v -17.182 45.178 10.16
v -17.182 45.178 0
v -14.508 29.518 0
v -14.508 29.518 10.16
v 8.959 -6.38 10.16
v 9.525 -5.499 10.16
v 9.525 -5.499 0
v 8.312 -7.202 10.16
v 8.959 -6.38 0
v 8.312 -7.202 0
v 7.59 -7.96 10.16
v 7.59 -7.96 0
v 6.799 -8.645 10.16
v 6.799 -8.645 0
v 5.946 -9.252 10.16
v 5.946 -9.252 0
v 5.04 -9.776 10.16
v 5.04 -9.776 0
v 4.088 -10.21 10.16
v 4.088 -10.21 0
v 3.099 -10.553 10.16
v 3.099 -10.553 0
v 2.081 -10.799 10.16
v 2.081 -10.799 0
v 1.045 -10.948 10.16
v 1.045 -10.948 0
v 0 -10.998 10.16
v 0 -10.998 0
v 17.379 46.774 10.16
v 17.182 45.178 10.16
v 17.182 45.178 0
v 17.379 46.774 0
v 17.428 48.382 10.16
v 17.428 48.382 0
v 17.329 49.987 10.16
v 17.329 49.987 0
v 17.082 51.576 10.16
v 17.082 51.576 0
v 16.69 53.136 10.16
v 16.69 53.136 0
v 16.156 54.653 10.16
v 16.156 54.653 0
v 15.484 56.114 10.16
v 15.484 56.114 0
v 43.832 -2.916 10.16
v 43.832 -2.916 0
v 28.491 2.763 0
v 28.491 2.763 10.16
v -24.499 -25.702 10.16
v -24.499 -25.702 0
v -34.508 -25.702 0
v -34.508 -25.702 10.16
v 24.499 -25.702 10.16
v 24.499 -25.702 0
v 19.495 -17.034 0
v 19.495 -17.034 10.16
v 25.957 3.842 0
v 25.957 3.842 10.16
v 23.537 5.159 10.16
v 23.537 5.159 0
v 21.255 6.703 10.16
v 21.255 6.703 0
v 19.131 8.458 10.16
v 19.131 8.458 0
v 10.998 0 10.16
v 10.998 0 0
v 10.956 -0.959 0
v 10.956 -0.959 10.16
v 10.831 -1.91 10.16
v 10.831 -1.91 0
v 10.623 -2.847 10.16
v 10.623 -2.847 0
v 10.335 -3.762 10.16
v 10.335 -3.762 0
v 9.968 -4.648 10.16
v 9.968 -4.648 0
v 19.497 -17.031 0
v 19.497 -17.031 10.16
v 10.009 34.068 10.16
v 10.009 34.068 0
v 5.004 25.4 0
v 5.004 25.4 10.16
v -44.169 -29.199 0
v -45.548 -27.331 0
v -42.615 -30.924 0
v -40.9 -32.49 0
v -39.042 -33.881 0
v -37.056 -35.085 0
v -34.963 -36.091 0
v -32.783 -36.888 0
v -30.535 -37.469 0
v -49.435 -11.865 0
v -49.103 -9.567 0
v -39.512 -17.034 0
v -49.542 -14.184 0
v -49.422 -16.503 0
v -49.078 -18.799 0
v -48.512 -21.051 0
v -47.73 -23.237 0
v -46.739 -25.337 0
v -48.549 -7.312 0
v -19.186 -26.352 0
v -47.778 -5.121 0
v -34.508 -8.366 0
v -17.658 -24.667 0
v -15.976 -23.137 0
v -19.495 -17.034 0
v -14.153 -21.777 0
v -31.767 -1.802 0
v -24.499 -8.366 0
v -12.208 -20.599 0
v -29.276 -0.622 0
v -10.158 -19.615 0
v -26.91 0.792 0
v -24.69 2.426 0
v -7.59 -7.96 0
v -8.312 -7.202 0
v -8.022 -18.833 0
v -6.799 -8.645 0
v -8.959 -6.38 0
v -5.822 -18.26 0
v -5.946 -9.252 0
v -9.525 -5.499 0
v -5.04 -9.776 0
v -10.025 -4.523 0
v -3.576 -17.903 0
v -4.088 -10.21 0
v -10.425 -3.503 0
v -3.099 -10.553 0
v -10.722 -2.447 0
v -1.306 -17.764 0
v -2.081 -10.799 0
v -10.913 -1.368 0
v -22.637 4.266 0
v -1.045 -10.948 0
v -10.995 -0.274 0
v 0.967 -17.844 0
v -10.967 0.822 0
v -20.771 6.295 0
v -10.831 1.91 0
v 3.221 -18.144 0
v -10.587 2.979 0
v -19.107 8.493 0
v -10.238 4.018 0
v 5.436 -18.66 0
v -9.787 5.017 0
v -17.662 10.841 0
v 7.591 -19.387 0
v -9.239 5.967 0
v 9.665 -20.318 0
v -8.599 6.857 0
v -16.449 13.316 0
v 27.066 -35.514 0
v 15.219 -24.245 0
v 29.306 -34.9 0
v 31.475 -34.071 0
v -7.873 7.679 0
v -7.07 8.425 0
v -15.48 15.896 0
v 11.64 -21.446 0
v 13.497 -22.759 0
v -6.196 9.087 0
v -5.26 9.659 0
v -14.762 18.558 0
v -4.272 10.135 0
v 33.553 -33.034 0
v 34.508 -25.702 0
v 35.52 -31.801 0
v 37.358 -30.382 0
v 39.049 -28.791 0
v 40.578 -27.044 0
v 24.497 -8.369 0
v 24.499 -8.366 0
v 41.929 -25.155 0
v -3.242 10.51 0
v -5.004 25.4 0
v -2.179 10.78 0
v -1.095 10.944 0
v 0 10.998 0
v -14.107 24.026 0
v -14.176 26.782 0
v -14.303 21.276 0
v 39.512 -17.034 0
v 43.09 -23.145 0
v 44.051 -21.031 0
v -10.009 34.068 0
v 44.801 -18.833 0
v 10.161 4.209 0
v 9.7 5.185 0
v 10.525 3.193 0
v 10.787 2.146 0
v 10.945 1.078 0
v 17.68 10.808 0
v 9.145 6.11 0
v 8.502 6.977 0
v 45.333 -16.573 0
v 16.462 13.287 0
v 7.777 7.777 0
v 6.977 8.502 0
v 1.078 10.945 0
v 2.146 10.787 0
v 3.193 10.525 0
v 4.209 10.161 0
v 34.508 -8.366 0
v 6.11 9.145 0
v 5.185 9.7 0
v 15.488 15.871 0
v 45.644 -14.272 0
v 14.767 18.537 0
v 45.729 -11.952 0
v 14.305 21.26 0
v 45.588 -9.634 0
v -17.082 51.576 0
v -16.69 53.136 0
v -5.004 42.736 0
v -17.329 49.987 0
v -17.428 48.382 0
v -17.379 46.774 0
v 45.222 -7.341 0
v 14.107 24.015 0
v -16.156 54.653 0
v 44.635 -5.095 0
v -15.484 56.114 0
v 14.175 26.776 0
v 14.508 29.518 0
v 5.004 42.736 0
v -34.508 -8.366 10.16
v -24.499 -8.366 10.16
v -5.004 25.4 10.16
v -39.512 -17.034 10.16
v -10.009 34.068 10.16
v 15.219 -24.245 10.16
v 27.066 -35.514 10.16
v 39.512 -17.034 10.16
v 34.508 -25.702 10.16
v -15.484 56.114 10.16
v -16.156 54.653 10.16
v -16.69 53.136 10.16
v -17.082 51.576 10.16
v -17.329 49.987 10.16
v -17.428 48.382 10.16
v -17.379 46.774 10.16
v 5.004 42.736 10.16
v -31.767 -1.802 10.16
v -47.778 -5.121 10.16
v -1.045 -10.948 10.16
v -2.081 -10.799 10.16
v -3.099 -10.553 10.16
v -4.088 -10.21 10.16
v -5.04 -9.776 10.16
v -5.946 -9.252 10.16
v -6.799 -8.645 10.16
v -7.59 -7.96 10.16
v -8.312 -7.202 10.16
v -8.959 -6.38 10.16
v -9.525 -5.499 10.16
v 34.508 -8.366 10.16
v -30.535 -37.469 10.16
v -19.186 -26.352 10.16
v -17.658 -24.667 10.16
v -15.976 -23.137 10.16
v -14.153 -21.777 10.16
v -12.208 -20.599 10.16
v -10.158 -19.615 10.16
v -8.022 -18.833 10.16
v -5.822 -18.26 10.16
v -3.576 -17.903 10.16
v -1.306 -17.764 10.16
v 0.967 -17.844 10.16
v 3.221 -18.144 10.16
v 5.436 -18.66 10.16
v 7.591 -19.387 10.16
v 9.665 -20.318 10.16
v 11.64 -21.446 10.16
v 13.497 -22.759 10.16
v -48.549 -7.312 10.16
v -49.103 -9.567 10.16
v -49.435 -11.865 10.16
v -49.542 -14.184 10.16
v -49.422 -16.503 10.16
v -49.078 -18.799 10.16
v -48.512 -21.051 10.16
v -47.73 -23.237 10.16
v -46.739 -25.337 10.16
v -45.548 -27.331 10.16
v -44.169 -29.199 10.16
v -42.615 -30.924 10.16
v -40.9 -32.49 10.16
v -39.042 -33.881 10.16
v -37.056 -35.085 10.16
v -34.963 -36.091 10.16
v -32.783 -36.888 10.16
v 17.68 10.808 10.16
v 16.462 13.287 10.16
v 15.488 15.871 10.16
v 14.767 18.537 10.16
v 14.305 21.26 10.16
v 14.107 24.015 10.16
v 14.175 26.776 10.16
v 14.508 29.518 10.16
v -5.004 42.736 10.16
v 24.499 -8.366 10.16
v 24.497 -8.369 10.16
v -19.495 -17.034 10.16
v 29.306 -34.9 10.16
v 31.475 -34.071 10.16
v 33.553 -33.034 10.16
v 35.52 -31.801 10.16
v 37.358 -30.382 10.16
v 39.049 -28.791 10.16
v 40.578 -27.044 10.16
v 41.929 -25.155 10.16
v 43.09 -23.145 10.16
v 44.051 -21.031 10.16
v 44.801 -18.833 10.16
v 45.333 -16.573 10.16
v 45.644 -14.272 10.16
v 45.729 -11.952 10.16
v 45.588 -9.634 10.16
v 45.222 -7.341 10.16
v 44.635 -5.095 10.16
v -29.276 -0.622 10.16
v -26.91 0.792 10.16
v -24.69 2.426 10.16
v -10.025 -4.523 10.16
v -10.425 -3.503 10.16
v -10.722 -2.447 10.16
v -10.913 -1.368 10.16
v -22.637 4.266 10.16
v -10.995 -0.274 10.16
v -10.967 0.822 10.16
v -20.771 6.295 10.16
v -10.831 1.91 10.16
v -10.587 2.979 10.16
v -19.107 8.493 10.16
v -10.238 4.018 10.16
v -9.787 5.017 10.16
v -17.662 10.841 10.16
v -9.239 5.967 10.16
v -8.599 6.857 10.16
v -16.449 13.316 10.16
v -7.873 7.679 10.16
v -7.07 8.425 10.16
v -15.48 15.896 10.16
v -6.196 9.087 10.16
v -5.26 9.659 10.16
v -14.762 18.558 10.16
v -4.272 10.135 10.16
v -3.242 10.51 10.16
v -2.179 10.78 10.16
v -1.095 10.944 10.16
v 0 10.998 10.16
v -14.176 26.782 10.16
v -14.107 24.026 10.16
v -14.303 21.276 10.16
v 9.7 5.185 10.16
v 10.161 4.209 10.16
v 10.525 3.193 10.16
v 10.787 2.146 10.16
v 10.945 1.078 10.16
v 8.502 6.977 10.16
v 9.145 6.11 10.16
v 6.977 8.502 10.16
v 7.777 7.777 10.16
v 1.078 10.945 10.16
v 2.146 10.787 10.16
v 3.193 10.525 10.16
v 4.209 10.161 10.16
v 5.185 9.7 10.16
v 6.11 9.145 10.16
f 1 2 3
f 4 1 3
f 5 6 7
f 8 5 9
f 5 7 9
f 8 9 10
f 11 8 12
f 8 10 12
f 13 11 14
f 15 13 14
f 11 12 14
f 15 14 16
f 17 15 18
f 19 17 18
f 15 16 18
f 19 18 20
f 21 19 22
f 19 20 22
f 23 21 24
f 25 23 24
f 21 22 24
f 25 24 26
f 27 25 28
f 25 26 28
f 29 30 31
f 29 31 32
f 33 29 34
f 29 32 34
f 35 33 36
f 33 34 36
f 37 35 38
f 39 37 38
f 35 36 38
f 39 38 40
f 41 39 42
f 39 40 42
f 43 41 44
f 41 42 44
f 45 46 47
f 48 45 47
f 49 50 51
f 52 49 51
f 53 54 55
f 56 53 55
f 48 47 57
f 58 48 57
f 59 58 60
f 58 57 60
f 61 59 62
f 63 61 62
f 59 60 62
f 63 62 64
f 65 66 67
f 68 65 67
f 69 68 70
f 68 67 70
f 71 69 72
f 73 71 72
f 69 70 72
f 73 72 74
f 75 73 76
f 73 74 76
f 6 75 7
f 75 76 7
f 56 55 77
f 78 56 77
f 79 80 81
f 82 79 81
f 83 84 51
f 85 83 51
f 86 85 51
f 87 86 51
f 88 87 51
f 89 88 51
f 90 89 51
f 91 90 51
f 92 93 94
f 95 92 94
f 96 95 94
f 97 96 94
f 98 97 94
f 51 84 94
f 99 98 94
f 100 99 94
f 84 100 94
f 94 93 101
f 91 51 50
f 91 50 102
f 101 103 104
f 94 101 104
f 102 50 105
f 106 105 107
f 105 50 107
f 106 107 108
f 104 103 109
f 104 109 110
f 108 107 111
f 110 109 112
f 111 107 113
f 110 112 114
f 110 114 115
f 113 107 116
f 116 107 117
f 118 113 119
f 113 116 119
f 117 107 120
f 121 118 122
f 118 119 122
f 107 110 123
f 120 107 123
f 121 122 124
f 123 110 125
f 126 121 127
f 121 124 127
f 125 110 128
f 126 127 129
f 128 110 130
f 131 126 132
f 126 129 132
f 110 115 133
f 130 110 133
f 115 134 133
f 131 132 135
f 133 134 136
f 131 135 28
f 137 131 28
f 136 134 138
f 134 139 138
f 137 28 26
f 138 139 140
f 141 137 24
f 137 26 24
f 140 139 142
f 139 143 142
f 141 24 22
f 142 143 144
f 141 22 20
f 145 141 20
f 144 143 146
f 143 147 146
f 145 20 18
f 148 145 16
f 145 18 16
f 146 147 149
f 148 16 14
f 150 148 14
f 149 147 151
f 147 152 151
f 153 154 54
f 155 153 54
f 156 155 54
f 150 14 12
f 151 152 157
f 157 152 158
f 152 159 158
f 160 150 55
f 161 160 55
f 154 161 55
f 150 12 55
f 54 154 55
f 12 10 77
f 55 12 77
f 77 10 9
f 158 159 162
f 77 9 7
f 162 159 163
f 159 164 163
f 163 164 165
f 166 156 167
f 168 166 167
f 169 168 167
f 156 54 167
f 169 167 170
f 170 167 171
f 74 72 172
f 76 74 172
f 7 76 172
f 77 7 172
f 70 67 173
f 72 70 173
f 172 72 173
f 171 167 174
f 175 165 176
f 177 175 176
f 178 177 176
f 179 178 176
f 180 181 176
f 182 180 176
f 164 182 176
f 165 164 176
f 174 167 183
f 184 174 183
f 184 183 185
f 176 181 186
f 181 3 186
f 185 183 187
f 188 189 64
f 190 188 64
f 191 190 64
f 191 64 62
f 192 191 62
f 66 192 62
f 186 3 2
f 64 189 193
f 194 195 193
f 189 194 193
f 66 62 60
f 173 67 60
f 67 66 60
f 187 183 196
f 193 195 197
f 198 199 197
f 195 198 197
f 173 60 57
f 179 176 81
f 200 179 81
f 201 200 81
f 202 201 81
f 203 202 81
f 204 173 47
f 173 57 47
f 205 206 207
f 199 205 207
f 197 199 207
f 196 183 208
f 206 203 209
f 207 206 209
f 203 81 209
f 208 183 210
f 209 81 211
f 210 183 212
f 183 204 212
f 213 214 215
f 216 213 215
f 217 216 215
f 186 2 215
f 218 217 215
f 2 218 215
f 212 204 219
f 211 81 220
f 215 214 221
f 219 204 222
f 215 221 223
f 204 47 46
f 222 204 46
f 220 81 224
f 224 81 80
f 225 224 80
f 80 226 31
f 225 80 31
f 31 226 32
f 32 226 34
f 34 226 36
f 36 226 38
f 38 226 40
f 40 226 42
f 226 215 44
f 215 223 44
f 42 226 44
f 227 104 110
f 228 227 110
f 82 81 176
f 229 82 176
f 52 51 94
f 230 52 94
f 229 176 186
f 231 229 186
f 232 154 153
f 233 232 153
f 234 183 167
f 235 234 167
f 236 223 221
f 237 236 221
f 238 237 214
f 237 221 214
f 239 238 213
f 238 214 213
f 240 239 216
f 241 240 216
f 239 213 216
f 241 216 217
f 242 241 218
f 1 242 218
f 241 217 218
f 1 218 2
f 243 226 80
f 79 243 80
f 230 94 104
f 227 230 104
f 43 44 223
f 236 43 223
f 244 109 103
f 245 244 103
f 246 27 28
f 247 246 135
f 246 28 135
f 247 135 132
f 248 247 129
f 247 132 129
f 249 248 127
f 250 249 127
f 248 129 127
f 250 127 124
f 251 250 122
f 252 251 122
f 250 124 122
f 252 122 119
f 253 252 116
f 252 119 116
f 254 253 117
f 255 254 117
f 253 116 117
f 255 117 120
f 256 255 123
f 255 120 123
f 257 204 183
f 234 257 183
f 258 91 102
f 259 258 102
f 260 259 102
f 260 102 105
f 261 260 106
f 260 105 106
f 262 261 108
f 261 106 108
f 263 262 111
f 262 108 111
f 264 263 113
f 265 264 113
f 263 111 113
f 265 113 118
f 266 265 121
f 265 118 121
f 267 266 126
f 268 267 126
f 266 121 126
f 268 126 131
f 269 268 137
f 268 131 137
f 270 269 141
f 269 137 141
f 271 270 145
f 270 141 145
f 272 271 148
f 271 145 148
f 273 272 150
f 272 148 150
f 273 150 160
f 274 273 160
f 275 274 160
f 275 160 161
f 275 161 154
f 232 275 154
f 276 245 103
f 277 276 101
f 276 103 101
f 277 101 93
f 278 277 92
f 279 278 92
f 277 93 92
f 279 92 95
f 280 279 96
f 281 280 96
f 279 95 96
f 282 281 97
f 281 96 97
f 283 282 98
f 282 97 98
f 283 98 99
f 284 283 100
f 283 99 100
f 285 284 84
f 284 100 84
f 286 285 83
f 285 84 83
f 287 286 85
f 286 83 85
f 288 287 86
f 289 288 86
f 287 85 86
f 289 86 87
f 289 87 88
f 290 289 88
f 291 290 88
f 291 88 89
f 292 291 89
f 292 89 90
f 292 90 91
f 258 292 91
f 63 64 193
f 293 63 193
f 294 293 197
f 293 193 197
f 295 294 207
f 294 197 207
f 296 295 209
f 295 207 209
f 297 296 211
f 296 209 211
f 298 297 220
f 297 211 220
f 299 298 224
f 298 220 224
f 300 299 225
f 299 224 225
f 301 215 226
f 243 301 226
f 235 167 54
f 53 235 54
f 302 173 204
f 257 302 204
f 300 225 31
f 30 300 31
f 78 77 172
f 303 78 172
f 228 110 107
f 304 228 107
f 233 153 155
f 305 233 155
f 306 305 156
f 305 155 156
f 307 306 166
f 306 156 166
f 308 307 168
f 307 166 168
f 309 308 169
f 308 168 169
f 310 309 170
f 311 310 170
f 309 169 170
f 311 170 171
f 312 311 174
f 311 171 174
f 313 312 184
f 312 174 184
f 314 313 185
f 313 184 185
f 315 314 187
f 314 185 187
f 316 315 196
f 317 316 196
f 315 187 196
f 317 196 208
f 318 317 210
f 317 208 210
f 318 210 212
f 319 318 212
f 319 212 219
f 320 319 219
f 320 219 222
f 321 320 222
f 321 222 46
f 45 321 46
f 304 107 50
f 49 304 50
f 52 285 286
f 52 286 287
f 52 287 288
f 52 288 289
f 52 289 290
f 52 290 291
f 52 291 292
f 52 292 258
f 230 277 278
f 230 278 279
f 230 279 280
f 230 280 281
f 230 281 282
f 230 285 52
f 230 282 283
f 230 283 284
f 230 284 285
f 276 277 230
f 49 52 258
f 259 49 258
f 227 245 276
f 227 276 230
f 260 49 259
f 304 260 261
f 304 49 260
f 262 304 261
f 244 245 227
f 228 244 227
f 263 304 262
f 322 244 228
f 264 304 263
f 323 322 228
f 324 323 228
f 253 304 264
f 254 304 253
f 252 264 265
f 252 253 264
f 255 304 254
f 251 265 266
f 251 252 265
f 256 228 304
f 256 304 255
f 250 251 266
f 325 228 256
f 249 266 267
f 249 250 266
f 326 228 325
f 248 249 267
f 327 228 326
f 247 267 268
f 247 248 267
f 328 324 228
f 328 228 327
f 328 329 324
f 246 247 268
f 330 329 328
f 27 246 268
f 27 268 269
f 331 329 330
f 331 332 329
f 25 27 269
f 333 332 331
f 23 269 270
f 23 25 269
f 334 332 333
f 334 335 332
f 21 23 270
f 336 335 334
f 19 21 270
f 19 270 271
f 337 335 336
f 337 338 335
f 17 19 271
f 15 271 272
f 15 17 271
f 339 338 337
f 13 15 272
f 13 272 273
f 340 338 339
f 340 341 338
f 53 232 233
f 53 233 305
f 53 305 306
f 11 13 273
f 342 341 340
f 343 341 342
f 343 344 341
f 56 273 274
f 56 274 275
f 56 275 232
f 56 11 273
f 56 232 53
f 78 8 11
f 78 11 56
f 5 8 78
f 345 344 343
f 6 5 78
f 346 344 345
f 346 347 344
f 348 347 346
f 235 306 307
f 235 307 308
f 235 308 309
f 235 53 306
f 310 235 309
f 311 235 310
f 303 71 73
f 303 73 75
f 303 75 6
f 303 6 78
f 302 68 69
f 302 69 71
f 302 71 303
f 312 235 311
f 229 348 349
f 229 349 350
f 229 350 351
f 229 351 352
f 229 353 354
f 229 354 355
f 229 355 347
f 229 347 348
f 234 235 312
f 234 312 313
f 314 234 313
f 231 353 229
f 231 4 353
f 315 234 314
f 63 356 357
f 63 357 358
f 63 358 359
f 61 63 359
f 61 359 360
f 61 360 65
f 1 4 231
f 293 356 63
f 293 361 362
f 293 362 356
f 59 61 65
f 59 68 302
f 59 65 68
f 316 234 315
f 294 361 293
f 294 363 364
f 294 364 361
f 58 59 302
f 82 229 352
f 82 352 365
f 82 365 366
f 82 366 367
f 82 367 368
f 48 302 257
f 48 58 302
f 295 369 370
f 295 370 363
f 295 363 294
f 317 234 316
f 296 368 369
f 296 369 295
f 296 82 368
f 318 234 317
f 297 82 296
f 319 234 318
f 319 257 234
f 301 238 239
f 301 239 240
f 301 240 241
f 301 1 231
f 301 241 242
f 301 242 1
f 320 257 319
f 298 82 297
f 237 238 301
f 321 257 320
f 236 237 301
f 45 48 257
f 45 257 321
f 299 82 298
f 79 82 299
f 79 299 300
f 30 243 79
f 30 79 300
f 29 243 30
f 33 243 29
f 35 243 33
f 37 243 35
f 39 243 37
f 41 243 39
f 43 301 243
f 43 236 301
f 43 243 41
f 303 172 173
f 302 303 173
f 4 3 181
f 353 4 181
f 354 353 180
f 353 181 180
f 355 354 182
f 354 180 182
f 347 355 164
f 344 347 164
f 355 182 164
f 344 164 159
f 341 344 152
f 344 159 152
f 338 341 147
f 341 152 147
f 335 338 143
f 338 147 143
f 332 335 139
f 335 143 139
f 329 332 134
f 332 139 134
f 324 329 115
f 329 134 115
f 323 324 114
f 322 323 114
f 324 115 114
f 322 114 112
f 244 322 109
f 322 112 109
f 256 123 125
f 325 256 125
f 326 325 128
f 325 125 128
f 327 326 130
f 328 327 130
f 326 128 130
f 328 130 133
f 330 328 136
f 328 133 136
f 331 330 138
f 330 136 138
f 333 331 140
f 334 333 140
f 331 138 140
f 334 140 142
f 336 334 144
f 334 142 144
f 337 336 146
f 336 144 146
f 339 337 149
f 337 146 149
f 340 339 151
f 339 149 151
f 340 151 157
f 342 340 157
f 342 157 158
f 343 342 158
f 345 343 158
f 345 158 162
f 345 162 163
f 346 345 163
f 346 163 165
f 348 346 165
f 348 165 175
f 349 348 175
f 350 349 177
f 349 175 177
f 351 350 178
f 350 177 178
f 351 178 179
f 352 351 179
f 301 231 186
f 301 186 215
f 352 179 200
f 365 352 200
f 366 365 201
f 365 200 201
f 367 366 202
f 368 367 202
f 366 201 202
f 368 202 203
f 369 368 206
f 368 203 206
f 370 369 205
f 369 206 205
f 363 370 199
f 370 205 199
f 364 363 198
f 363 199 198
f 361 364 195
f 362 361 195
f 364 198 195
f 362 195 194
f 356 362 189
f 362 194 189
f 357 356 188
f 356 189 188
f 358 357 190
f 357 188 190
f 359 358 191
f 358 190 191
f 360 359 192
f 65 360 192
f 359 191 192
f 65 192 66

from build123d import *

# Parameters (mm, degrees)
F1_DEPTH = 10.16
F2_DEPTH = 10.16


with BuildPart() as f1:
    # F0 (on Top) → F1 (new body)
    with BuildSketch(Plane.XY):
        with BuildLine():
            Line((-31.7672, -1.802307), (-47.777991, -5.121411))
            Line((-47.777991, -5.121411), (-30.534543, -37.468957))
            Line((-30.534543, -37.468957), (-19.185807, -26.351705))
            ThreePointArc((-19.185807, -26.351705), (-2.4424, -17.805796), (15.218731, -24.244639))
            Line((15.218731, -24.244639), (27.066497, -35.513725))
            ThreePointArc((27.066497, -35.513725), (43.090442, -23.144741), (43.831861, -2.915829))
            Line((43.831861, -2.915829), (28.491493, 2.762567))
            ThreePointArc((28.491493, 2.762567), (23.536918, 5.15939), (19.131085, 8.458057))
            ThreePointArc((19.131085, 8.458057), (14.766541, 18.537353), (14.508489, 29.518011))
            Line((14.508489, 29.518011), (17.181797, 45.178168))
            ThreePointArc((17.181797, 45.178168), (17.224125, 50.784528), (15.484437, 56.114307))
            Line((15.484437, 56.114307), (-15.484437, 56.114307))
            ThreePointArc((-15.484437, 56.114307), (-17.224125, 50.784528), (-17.181797, 45.178168))
            Line((-17.181797, 45.178168), (-14.508489, 29.518011))
            ThreePointArc((-14.508489, 29.518011), (-17.662338, 10.840635), (-31.7672, -1.802307))
        make_face()
        Polygon((-24.499209, -8.366125), (-21.997045, -12.7), (-19.494881, -17.033875), (-24.499209, -25.701625), (-34.507865, -25.701625), (-39.512193, -17.033875), (-34.507865, -8.366125), align=None, mode=Mode.SUBTRACT)
        Polygon((19.496714, -17.0307), (21.997045, -12.7), (24.497376, -8.3693), (24.499209, -8.366125), (34.507865, -8.366125), (39.512193, -17.033875), (34.507865, -25.701625), (24.499209, -25.701625), (19.494881, -17.033875), align=None, mode=Mode.SUBTRACT)
        with BuildLine():
            ThreePointArc((-9.524721, -5.4991), (-9.524721, 5.4991), (0, 10.9982))
            ThreePointArc((0, 10.9982), (7.776902, 7.776902), (10.9982, 0))
            ThreePointArc((10.9982, 0), (10.623445, -2.846544), (9.524721, -5.4991))
            ThreePointArc((9.524721, -5.4991), (5.4991, -9.524721), (0, -10.9982))
            ThreePointArc((0, -10.9982), (-5.4991, -9.524721), (-9.524721, -5.4991))
        make_face(mode=Mode.SUBTRACT)
        Polygon((5.004328, 25.4), (0, 25.4), (-5.004328, 25.4), (-10.008656, 34.06775), (-5.004328, 42.7355), (5.004328, 42.7355), (10.008656, 34.06775), align=None, mode=Mode.SUBTRACT)
    extrude(amount=F1_DEPTH)

    # F0 (on Top) → F2 (join)
    with BuildSketch(Plane.XY):
        with BuildLine():
            Line((-30.534543, -37.468957), (-47.777991, -5.121411))
            ThreePointArc((-47.777991, -5.121411), (-46.738845, -25.337215), (-30.534543, -37.468957))
        make_face()
    extrude(amount=F2_DEPTH)


solid = f1.part
